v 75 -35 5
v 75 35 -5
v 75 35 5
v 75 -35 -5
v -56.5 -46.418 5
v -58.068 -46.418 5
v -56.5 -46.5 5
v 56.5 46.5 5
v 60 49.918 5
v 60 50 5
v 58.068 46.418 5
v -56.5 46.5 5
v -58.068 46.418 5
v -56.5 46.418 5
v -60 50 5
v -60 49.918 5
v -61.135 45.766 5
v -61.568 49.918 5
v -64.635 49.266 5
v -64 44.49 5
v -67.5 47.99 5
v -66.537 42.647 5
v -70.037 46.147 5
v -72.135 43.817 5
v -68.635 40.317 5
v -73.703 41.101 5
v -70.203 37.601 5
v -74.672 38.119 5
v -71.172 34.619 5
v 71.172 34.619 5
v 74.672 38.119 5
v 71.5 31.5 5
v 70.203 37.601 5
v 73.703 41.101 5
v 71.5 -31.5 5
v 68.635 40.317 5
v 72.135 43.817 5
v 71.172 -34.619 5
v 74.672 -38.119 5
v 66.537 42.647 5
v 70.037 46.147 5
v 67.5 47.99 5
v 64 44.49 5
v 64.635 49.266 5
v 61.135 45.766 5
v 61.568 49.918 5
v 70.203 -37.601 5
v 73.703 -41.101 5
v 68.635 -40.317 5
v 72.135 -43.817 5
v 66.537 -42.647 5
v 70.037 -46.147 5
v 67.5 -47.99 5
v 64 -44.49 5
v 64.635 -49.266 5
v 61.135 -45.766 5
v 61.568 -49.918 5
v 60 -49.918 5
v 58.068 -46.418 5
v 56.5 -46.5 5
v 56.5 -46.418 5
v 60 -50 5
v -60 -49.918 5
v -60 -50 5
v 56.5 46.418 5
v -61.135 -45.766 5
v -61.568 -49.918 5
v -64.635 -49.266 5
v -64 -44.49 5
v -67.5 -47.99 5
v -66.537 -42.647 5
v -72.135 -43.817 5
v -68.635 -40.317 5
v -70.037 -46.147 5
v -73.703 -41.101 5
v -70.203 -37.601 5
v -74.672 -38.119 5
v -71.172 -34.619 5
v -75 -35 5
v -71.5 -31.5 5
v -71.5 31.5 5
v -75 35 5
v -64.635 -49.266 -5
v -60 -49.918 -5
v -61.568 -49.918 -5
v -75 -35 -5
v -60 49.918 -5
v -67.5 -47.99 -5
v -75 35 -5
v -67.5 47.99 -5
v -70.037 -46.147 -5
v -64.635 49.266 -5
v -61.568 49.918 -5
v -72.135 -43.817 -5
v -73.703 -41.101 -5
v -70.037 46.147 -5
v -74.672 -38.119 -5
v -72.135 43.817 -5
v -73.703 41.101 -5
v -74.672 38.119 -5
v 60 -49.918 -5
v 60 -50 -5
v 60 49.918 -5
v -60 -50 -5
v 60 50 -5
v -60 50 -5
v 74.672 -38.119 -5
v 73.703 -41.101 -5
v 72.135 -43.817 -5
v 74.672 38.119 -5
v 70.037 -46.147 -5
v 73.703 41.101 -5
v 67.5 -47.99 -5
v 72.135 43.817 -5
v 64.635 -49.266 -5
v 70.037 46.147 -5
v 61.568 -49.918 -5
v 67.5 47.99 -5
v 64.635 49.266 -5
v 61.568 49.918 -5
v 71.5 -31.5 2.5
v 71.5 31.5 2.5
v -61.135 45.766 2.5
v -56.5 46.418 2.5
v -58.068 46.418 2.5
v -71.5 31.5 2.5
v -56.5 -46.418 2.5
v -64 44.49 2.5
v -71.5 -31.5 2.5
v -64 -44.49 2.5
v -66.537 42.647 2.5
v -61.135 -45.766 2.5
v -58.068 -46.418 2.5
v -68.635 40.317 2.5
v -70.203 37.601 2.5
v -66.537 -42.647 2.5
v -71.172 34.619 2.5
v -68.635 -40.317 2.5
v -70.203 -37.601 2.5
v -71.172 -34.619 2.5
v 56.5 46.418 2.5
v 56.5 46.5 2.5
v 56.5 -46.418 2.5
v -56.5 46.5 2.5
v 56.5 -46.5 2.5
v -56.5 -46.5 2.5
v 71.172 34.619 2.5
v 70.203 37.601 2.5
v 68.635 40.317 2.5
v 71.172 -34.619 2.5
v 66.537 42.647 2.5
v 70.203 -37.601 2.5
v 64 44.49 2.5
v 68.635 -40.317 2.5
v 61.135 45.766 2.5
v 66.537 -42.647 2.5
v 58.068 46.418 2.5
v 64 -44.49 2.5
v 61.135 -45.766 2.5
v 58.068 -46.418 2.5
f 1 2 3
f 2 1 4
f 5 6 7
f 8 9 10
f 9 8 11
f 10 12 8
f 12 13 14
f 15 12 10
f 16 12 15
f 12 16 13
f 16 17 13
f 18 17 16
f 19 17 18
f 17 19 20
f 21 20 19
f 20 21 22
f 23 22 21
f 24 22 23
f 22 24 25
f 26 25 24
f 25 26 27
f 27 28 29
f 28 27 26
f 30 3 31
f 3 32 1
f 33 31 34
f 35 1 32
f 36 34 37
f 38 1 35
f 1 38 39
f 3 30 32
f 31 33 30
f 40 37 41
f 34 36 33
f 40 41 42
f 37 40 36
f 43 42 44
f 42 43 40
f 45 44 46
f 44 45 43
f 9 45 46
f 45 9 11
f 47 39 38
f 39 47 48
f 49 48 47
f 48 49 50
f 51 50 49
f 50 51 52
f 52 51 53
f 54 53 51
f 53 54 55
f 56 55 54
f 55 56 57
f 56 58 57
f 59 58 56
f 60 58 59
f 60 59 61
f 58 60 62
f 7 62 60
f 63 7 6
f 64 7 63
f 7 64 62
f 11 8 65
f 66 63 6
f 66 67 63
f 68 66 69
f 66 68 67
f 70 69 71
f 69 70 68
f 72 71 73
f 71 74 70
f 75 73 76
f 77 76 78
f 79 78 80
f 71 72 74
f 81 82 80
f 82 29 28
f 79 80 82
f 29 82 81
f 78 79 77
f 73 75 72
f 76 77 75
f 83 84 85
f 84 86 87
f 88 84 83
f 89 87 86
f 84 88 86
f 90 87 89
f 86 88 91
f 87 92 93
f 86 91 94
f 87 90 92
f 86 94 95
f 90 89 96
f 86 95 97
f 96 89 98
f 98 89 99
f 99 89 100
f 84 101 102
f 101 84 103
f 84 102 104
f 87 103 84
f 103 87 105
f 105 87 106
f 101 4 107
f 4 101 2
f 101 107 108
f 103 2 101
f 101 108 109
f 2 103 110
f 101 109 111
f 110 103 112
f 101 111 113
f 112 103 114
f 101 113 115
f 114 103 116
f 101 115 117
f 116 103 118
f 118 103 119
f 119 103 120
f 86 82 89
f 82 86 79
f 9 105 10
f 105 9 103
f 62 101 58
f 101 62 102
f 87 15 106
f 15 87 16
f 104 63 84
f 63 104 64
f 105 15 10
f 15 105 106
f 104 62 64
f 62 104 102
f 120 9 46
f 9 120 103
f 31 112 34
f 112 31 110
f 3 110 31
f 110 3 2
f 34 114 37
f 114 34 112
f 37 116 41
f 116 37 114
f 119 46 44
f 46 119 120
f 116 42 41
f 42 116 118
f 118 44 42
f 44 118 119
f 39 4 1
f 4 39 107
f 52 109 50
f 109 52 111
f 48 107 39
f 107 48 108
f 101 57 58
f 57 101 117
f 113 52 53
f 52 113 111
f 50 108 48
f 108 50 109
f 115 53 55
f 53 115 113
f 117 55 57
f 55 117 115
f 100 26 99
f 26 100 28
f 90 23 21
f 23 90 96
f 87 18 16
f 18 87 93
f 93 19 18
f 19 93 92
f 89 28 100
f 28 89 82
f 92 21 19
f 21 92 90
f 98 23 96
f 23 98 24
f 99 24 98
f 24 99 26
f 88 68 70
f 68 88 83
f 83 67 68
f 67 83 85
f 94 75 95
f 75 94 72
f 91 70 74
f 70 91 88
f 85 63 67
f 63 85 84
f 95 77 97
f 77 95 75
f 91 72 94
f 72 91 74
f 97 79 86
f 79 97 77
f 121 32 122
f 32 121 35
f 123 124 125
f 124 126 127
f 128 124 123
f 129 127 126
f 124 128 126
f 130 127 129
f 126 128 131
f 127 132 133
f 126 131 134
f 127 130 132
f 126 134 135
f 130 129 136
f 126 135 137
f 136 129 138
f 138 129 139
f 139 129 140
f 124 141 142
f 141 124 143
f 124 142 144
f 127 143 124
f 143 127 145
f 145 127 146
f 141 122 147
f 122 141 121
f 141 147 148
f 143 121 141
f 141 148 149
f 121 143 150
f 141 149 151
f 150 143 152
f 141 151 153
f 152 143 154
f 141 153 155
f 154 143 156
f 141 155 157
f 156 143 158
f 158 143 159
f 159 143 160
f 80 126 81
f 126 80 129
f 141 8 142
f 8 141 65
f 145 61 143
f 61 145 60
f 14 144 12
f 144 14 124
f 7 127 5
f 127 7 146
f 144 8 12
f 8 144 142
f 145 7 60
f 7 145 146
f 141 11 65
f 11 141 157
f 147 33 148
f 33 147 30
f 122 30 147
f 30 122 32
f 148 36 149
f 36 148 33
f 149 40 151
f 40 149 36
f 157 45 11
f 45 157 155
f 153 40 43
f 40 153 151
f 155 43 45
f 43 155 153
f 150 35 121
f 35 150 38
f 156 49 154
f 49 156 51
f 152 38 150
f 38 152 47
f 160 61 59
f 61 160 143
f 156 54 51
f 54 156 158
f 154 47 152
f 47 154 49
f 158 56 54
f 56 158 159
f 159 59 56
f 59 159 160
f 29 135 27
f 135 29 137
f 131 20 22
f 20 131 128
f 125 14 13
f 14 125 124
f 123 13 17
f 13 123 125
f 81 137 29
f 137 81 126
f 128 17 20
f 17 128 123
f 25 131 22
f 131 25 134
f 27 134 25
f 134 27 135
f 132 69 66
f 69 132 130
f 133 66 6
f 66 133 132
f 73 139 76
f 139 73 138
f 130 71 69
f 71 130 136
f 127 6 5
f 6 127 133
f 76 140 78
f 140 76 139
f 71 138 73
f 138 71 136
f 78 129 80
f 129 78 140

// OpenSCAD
w = 150; h = 100; d = 10; wh_offset = 7;

color("tomato") difference(){
    base(w, h, r=15, depth=d);
    translate([0, 0, d/2]){
        color("lime") base(w - wh_offset, h - wh_offset, r=15, depth=5);
    }
}

module base(x_width, y_height, r, depth) {
    color("tomato") union(){
        color("lime") cube([x_width, y_height-(2*r), depth], center = true);
        color("aqua") cube([x_width-(2*r), y_height, depth], center = true);
        translate([(x_width/2 - r), (y_height/2 - r), 0]){
            color("red") cylinder(h=depth, r1=r, r2=r, center = true);
        }
        translate([(x_width/2 - r), -(y_height/2 - r), 0]){
            color("red") cylinder(h=depth, r1=r, r2=r, center = true);
        }
        translate([-(x_width/2 - r), (y_height/2 - r), 0]){
            color("red") cylinder(h=depth, r1=r, r2=r, center = true);
        }
        translate([-(x_width/2 - r), -(y_height/2 - r), 0]){
            color("red") cylinder(h=depth, r1=r, r2=r, center = true);
        }
    }
}
